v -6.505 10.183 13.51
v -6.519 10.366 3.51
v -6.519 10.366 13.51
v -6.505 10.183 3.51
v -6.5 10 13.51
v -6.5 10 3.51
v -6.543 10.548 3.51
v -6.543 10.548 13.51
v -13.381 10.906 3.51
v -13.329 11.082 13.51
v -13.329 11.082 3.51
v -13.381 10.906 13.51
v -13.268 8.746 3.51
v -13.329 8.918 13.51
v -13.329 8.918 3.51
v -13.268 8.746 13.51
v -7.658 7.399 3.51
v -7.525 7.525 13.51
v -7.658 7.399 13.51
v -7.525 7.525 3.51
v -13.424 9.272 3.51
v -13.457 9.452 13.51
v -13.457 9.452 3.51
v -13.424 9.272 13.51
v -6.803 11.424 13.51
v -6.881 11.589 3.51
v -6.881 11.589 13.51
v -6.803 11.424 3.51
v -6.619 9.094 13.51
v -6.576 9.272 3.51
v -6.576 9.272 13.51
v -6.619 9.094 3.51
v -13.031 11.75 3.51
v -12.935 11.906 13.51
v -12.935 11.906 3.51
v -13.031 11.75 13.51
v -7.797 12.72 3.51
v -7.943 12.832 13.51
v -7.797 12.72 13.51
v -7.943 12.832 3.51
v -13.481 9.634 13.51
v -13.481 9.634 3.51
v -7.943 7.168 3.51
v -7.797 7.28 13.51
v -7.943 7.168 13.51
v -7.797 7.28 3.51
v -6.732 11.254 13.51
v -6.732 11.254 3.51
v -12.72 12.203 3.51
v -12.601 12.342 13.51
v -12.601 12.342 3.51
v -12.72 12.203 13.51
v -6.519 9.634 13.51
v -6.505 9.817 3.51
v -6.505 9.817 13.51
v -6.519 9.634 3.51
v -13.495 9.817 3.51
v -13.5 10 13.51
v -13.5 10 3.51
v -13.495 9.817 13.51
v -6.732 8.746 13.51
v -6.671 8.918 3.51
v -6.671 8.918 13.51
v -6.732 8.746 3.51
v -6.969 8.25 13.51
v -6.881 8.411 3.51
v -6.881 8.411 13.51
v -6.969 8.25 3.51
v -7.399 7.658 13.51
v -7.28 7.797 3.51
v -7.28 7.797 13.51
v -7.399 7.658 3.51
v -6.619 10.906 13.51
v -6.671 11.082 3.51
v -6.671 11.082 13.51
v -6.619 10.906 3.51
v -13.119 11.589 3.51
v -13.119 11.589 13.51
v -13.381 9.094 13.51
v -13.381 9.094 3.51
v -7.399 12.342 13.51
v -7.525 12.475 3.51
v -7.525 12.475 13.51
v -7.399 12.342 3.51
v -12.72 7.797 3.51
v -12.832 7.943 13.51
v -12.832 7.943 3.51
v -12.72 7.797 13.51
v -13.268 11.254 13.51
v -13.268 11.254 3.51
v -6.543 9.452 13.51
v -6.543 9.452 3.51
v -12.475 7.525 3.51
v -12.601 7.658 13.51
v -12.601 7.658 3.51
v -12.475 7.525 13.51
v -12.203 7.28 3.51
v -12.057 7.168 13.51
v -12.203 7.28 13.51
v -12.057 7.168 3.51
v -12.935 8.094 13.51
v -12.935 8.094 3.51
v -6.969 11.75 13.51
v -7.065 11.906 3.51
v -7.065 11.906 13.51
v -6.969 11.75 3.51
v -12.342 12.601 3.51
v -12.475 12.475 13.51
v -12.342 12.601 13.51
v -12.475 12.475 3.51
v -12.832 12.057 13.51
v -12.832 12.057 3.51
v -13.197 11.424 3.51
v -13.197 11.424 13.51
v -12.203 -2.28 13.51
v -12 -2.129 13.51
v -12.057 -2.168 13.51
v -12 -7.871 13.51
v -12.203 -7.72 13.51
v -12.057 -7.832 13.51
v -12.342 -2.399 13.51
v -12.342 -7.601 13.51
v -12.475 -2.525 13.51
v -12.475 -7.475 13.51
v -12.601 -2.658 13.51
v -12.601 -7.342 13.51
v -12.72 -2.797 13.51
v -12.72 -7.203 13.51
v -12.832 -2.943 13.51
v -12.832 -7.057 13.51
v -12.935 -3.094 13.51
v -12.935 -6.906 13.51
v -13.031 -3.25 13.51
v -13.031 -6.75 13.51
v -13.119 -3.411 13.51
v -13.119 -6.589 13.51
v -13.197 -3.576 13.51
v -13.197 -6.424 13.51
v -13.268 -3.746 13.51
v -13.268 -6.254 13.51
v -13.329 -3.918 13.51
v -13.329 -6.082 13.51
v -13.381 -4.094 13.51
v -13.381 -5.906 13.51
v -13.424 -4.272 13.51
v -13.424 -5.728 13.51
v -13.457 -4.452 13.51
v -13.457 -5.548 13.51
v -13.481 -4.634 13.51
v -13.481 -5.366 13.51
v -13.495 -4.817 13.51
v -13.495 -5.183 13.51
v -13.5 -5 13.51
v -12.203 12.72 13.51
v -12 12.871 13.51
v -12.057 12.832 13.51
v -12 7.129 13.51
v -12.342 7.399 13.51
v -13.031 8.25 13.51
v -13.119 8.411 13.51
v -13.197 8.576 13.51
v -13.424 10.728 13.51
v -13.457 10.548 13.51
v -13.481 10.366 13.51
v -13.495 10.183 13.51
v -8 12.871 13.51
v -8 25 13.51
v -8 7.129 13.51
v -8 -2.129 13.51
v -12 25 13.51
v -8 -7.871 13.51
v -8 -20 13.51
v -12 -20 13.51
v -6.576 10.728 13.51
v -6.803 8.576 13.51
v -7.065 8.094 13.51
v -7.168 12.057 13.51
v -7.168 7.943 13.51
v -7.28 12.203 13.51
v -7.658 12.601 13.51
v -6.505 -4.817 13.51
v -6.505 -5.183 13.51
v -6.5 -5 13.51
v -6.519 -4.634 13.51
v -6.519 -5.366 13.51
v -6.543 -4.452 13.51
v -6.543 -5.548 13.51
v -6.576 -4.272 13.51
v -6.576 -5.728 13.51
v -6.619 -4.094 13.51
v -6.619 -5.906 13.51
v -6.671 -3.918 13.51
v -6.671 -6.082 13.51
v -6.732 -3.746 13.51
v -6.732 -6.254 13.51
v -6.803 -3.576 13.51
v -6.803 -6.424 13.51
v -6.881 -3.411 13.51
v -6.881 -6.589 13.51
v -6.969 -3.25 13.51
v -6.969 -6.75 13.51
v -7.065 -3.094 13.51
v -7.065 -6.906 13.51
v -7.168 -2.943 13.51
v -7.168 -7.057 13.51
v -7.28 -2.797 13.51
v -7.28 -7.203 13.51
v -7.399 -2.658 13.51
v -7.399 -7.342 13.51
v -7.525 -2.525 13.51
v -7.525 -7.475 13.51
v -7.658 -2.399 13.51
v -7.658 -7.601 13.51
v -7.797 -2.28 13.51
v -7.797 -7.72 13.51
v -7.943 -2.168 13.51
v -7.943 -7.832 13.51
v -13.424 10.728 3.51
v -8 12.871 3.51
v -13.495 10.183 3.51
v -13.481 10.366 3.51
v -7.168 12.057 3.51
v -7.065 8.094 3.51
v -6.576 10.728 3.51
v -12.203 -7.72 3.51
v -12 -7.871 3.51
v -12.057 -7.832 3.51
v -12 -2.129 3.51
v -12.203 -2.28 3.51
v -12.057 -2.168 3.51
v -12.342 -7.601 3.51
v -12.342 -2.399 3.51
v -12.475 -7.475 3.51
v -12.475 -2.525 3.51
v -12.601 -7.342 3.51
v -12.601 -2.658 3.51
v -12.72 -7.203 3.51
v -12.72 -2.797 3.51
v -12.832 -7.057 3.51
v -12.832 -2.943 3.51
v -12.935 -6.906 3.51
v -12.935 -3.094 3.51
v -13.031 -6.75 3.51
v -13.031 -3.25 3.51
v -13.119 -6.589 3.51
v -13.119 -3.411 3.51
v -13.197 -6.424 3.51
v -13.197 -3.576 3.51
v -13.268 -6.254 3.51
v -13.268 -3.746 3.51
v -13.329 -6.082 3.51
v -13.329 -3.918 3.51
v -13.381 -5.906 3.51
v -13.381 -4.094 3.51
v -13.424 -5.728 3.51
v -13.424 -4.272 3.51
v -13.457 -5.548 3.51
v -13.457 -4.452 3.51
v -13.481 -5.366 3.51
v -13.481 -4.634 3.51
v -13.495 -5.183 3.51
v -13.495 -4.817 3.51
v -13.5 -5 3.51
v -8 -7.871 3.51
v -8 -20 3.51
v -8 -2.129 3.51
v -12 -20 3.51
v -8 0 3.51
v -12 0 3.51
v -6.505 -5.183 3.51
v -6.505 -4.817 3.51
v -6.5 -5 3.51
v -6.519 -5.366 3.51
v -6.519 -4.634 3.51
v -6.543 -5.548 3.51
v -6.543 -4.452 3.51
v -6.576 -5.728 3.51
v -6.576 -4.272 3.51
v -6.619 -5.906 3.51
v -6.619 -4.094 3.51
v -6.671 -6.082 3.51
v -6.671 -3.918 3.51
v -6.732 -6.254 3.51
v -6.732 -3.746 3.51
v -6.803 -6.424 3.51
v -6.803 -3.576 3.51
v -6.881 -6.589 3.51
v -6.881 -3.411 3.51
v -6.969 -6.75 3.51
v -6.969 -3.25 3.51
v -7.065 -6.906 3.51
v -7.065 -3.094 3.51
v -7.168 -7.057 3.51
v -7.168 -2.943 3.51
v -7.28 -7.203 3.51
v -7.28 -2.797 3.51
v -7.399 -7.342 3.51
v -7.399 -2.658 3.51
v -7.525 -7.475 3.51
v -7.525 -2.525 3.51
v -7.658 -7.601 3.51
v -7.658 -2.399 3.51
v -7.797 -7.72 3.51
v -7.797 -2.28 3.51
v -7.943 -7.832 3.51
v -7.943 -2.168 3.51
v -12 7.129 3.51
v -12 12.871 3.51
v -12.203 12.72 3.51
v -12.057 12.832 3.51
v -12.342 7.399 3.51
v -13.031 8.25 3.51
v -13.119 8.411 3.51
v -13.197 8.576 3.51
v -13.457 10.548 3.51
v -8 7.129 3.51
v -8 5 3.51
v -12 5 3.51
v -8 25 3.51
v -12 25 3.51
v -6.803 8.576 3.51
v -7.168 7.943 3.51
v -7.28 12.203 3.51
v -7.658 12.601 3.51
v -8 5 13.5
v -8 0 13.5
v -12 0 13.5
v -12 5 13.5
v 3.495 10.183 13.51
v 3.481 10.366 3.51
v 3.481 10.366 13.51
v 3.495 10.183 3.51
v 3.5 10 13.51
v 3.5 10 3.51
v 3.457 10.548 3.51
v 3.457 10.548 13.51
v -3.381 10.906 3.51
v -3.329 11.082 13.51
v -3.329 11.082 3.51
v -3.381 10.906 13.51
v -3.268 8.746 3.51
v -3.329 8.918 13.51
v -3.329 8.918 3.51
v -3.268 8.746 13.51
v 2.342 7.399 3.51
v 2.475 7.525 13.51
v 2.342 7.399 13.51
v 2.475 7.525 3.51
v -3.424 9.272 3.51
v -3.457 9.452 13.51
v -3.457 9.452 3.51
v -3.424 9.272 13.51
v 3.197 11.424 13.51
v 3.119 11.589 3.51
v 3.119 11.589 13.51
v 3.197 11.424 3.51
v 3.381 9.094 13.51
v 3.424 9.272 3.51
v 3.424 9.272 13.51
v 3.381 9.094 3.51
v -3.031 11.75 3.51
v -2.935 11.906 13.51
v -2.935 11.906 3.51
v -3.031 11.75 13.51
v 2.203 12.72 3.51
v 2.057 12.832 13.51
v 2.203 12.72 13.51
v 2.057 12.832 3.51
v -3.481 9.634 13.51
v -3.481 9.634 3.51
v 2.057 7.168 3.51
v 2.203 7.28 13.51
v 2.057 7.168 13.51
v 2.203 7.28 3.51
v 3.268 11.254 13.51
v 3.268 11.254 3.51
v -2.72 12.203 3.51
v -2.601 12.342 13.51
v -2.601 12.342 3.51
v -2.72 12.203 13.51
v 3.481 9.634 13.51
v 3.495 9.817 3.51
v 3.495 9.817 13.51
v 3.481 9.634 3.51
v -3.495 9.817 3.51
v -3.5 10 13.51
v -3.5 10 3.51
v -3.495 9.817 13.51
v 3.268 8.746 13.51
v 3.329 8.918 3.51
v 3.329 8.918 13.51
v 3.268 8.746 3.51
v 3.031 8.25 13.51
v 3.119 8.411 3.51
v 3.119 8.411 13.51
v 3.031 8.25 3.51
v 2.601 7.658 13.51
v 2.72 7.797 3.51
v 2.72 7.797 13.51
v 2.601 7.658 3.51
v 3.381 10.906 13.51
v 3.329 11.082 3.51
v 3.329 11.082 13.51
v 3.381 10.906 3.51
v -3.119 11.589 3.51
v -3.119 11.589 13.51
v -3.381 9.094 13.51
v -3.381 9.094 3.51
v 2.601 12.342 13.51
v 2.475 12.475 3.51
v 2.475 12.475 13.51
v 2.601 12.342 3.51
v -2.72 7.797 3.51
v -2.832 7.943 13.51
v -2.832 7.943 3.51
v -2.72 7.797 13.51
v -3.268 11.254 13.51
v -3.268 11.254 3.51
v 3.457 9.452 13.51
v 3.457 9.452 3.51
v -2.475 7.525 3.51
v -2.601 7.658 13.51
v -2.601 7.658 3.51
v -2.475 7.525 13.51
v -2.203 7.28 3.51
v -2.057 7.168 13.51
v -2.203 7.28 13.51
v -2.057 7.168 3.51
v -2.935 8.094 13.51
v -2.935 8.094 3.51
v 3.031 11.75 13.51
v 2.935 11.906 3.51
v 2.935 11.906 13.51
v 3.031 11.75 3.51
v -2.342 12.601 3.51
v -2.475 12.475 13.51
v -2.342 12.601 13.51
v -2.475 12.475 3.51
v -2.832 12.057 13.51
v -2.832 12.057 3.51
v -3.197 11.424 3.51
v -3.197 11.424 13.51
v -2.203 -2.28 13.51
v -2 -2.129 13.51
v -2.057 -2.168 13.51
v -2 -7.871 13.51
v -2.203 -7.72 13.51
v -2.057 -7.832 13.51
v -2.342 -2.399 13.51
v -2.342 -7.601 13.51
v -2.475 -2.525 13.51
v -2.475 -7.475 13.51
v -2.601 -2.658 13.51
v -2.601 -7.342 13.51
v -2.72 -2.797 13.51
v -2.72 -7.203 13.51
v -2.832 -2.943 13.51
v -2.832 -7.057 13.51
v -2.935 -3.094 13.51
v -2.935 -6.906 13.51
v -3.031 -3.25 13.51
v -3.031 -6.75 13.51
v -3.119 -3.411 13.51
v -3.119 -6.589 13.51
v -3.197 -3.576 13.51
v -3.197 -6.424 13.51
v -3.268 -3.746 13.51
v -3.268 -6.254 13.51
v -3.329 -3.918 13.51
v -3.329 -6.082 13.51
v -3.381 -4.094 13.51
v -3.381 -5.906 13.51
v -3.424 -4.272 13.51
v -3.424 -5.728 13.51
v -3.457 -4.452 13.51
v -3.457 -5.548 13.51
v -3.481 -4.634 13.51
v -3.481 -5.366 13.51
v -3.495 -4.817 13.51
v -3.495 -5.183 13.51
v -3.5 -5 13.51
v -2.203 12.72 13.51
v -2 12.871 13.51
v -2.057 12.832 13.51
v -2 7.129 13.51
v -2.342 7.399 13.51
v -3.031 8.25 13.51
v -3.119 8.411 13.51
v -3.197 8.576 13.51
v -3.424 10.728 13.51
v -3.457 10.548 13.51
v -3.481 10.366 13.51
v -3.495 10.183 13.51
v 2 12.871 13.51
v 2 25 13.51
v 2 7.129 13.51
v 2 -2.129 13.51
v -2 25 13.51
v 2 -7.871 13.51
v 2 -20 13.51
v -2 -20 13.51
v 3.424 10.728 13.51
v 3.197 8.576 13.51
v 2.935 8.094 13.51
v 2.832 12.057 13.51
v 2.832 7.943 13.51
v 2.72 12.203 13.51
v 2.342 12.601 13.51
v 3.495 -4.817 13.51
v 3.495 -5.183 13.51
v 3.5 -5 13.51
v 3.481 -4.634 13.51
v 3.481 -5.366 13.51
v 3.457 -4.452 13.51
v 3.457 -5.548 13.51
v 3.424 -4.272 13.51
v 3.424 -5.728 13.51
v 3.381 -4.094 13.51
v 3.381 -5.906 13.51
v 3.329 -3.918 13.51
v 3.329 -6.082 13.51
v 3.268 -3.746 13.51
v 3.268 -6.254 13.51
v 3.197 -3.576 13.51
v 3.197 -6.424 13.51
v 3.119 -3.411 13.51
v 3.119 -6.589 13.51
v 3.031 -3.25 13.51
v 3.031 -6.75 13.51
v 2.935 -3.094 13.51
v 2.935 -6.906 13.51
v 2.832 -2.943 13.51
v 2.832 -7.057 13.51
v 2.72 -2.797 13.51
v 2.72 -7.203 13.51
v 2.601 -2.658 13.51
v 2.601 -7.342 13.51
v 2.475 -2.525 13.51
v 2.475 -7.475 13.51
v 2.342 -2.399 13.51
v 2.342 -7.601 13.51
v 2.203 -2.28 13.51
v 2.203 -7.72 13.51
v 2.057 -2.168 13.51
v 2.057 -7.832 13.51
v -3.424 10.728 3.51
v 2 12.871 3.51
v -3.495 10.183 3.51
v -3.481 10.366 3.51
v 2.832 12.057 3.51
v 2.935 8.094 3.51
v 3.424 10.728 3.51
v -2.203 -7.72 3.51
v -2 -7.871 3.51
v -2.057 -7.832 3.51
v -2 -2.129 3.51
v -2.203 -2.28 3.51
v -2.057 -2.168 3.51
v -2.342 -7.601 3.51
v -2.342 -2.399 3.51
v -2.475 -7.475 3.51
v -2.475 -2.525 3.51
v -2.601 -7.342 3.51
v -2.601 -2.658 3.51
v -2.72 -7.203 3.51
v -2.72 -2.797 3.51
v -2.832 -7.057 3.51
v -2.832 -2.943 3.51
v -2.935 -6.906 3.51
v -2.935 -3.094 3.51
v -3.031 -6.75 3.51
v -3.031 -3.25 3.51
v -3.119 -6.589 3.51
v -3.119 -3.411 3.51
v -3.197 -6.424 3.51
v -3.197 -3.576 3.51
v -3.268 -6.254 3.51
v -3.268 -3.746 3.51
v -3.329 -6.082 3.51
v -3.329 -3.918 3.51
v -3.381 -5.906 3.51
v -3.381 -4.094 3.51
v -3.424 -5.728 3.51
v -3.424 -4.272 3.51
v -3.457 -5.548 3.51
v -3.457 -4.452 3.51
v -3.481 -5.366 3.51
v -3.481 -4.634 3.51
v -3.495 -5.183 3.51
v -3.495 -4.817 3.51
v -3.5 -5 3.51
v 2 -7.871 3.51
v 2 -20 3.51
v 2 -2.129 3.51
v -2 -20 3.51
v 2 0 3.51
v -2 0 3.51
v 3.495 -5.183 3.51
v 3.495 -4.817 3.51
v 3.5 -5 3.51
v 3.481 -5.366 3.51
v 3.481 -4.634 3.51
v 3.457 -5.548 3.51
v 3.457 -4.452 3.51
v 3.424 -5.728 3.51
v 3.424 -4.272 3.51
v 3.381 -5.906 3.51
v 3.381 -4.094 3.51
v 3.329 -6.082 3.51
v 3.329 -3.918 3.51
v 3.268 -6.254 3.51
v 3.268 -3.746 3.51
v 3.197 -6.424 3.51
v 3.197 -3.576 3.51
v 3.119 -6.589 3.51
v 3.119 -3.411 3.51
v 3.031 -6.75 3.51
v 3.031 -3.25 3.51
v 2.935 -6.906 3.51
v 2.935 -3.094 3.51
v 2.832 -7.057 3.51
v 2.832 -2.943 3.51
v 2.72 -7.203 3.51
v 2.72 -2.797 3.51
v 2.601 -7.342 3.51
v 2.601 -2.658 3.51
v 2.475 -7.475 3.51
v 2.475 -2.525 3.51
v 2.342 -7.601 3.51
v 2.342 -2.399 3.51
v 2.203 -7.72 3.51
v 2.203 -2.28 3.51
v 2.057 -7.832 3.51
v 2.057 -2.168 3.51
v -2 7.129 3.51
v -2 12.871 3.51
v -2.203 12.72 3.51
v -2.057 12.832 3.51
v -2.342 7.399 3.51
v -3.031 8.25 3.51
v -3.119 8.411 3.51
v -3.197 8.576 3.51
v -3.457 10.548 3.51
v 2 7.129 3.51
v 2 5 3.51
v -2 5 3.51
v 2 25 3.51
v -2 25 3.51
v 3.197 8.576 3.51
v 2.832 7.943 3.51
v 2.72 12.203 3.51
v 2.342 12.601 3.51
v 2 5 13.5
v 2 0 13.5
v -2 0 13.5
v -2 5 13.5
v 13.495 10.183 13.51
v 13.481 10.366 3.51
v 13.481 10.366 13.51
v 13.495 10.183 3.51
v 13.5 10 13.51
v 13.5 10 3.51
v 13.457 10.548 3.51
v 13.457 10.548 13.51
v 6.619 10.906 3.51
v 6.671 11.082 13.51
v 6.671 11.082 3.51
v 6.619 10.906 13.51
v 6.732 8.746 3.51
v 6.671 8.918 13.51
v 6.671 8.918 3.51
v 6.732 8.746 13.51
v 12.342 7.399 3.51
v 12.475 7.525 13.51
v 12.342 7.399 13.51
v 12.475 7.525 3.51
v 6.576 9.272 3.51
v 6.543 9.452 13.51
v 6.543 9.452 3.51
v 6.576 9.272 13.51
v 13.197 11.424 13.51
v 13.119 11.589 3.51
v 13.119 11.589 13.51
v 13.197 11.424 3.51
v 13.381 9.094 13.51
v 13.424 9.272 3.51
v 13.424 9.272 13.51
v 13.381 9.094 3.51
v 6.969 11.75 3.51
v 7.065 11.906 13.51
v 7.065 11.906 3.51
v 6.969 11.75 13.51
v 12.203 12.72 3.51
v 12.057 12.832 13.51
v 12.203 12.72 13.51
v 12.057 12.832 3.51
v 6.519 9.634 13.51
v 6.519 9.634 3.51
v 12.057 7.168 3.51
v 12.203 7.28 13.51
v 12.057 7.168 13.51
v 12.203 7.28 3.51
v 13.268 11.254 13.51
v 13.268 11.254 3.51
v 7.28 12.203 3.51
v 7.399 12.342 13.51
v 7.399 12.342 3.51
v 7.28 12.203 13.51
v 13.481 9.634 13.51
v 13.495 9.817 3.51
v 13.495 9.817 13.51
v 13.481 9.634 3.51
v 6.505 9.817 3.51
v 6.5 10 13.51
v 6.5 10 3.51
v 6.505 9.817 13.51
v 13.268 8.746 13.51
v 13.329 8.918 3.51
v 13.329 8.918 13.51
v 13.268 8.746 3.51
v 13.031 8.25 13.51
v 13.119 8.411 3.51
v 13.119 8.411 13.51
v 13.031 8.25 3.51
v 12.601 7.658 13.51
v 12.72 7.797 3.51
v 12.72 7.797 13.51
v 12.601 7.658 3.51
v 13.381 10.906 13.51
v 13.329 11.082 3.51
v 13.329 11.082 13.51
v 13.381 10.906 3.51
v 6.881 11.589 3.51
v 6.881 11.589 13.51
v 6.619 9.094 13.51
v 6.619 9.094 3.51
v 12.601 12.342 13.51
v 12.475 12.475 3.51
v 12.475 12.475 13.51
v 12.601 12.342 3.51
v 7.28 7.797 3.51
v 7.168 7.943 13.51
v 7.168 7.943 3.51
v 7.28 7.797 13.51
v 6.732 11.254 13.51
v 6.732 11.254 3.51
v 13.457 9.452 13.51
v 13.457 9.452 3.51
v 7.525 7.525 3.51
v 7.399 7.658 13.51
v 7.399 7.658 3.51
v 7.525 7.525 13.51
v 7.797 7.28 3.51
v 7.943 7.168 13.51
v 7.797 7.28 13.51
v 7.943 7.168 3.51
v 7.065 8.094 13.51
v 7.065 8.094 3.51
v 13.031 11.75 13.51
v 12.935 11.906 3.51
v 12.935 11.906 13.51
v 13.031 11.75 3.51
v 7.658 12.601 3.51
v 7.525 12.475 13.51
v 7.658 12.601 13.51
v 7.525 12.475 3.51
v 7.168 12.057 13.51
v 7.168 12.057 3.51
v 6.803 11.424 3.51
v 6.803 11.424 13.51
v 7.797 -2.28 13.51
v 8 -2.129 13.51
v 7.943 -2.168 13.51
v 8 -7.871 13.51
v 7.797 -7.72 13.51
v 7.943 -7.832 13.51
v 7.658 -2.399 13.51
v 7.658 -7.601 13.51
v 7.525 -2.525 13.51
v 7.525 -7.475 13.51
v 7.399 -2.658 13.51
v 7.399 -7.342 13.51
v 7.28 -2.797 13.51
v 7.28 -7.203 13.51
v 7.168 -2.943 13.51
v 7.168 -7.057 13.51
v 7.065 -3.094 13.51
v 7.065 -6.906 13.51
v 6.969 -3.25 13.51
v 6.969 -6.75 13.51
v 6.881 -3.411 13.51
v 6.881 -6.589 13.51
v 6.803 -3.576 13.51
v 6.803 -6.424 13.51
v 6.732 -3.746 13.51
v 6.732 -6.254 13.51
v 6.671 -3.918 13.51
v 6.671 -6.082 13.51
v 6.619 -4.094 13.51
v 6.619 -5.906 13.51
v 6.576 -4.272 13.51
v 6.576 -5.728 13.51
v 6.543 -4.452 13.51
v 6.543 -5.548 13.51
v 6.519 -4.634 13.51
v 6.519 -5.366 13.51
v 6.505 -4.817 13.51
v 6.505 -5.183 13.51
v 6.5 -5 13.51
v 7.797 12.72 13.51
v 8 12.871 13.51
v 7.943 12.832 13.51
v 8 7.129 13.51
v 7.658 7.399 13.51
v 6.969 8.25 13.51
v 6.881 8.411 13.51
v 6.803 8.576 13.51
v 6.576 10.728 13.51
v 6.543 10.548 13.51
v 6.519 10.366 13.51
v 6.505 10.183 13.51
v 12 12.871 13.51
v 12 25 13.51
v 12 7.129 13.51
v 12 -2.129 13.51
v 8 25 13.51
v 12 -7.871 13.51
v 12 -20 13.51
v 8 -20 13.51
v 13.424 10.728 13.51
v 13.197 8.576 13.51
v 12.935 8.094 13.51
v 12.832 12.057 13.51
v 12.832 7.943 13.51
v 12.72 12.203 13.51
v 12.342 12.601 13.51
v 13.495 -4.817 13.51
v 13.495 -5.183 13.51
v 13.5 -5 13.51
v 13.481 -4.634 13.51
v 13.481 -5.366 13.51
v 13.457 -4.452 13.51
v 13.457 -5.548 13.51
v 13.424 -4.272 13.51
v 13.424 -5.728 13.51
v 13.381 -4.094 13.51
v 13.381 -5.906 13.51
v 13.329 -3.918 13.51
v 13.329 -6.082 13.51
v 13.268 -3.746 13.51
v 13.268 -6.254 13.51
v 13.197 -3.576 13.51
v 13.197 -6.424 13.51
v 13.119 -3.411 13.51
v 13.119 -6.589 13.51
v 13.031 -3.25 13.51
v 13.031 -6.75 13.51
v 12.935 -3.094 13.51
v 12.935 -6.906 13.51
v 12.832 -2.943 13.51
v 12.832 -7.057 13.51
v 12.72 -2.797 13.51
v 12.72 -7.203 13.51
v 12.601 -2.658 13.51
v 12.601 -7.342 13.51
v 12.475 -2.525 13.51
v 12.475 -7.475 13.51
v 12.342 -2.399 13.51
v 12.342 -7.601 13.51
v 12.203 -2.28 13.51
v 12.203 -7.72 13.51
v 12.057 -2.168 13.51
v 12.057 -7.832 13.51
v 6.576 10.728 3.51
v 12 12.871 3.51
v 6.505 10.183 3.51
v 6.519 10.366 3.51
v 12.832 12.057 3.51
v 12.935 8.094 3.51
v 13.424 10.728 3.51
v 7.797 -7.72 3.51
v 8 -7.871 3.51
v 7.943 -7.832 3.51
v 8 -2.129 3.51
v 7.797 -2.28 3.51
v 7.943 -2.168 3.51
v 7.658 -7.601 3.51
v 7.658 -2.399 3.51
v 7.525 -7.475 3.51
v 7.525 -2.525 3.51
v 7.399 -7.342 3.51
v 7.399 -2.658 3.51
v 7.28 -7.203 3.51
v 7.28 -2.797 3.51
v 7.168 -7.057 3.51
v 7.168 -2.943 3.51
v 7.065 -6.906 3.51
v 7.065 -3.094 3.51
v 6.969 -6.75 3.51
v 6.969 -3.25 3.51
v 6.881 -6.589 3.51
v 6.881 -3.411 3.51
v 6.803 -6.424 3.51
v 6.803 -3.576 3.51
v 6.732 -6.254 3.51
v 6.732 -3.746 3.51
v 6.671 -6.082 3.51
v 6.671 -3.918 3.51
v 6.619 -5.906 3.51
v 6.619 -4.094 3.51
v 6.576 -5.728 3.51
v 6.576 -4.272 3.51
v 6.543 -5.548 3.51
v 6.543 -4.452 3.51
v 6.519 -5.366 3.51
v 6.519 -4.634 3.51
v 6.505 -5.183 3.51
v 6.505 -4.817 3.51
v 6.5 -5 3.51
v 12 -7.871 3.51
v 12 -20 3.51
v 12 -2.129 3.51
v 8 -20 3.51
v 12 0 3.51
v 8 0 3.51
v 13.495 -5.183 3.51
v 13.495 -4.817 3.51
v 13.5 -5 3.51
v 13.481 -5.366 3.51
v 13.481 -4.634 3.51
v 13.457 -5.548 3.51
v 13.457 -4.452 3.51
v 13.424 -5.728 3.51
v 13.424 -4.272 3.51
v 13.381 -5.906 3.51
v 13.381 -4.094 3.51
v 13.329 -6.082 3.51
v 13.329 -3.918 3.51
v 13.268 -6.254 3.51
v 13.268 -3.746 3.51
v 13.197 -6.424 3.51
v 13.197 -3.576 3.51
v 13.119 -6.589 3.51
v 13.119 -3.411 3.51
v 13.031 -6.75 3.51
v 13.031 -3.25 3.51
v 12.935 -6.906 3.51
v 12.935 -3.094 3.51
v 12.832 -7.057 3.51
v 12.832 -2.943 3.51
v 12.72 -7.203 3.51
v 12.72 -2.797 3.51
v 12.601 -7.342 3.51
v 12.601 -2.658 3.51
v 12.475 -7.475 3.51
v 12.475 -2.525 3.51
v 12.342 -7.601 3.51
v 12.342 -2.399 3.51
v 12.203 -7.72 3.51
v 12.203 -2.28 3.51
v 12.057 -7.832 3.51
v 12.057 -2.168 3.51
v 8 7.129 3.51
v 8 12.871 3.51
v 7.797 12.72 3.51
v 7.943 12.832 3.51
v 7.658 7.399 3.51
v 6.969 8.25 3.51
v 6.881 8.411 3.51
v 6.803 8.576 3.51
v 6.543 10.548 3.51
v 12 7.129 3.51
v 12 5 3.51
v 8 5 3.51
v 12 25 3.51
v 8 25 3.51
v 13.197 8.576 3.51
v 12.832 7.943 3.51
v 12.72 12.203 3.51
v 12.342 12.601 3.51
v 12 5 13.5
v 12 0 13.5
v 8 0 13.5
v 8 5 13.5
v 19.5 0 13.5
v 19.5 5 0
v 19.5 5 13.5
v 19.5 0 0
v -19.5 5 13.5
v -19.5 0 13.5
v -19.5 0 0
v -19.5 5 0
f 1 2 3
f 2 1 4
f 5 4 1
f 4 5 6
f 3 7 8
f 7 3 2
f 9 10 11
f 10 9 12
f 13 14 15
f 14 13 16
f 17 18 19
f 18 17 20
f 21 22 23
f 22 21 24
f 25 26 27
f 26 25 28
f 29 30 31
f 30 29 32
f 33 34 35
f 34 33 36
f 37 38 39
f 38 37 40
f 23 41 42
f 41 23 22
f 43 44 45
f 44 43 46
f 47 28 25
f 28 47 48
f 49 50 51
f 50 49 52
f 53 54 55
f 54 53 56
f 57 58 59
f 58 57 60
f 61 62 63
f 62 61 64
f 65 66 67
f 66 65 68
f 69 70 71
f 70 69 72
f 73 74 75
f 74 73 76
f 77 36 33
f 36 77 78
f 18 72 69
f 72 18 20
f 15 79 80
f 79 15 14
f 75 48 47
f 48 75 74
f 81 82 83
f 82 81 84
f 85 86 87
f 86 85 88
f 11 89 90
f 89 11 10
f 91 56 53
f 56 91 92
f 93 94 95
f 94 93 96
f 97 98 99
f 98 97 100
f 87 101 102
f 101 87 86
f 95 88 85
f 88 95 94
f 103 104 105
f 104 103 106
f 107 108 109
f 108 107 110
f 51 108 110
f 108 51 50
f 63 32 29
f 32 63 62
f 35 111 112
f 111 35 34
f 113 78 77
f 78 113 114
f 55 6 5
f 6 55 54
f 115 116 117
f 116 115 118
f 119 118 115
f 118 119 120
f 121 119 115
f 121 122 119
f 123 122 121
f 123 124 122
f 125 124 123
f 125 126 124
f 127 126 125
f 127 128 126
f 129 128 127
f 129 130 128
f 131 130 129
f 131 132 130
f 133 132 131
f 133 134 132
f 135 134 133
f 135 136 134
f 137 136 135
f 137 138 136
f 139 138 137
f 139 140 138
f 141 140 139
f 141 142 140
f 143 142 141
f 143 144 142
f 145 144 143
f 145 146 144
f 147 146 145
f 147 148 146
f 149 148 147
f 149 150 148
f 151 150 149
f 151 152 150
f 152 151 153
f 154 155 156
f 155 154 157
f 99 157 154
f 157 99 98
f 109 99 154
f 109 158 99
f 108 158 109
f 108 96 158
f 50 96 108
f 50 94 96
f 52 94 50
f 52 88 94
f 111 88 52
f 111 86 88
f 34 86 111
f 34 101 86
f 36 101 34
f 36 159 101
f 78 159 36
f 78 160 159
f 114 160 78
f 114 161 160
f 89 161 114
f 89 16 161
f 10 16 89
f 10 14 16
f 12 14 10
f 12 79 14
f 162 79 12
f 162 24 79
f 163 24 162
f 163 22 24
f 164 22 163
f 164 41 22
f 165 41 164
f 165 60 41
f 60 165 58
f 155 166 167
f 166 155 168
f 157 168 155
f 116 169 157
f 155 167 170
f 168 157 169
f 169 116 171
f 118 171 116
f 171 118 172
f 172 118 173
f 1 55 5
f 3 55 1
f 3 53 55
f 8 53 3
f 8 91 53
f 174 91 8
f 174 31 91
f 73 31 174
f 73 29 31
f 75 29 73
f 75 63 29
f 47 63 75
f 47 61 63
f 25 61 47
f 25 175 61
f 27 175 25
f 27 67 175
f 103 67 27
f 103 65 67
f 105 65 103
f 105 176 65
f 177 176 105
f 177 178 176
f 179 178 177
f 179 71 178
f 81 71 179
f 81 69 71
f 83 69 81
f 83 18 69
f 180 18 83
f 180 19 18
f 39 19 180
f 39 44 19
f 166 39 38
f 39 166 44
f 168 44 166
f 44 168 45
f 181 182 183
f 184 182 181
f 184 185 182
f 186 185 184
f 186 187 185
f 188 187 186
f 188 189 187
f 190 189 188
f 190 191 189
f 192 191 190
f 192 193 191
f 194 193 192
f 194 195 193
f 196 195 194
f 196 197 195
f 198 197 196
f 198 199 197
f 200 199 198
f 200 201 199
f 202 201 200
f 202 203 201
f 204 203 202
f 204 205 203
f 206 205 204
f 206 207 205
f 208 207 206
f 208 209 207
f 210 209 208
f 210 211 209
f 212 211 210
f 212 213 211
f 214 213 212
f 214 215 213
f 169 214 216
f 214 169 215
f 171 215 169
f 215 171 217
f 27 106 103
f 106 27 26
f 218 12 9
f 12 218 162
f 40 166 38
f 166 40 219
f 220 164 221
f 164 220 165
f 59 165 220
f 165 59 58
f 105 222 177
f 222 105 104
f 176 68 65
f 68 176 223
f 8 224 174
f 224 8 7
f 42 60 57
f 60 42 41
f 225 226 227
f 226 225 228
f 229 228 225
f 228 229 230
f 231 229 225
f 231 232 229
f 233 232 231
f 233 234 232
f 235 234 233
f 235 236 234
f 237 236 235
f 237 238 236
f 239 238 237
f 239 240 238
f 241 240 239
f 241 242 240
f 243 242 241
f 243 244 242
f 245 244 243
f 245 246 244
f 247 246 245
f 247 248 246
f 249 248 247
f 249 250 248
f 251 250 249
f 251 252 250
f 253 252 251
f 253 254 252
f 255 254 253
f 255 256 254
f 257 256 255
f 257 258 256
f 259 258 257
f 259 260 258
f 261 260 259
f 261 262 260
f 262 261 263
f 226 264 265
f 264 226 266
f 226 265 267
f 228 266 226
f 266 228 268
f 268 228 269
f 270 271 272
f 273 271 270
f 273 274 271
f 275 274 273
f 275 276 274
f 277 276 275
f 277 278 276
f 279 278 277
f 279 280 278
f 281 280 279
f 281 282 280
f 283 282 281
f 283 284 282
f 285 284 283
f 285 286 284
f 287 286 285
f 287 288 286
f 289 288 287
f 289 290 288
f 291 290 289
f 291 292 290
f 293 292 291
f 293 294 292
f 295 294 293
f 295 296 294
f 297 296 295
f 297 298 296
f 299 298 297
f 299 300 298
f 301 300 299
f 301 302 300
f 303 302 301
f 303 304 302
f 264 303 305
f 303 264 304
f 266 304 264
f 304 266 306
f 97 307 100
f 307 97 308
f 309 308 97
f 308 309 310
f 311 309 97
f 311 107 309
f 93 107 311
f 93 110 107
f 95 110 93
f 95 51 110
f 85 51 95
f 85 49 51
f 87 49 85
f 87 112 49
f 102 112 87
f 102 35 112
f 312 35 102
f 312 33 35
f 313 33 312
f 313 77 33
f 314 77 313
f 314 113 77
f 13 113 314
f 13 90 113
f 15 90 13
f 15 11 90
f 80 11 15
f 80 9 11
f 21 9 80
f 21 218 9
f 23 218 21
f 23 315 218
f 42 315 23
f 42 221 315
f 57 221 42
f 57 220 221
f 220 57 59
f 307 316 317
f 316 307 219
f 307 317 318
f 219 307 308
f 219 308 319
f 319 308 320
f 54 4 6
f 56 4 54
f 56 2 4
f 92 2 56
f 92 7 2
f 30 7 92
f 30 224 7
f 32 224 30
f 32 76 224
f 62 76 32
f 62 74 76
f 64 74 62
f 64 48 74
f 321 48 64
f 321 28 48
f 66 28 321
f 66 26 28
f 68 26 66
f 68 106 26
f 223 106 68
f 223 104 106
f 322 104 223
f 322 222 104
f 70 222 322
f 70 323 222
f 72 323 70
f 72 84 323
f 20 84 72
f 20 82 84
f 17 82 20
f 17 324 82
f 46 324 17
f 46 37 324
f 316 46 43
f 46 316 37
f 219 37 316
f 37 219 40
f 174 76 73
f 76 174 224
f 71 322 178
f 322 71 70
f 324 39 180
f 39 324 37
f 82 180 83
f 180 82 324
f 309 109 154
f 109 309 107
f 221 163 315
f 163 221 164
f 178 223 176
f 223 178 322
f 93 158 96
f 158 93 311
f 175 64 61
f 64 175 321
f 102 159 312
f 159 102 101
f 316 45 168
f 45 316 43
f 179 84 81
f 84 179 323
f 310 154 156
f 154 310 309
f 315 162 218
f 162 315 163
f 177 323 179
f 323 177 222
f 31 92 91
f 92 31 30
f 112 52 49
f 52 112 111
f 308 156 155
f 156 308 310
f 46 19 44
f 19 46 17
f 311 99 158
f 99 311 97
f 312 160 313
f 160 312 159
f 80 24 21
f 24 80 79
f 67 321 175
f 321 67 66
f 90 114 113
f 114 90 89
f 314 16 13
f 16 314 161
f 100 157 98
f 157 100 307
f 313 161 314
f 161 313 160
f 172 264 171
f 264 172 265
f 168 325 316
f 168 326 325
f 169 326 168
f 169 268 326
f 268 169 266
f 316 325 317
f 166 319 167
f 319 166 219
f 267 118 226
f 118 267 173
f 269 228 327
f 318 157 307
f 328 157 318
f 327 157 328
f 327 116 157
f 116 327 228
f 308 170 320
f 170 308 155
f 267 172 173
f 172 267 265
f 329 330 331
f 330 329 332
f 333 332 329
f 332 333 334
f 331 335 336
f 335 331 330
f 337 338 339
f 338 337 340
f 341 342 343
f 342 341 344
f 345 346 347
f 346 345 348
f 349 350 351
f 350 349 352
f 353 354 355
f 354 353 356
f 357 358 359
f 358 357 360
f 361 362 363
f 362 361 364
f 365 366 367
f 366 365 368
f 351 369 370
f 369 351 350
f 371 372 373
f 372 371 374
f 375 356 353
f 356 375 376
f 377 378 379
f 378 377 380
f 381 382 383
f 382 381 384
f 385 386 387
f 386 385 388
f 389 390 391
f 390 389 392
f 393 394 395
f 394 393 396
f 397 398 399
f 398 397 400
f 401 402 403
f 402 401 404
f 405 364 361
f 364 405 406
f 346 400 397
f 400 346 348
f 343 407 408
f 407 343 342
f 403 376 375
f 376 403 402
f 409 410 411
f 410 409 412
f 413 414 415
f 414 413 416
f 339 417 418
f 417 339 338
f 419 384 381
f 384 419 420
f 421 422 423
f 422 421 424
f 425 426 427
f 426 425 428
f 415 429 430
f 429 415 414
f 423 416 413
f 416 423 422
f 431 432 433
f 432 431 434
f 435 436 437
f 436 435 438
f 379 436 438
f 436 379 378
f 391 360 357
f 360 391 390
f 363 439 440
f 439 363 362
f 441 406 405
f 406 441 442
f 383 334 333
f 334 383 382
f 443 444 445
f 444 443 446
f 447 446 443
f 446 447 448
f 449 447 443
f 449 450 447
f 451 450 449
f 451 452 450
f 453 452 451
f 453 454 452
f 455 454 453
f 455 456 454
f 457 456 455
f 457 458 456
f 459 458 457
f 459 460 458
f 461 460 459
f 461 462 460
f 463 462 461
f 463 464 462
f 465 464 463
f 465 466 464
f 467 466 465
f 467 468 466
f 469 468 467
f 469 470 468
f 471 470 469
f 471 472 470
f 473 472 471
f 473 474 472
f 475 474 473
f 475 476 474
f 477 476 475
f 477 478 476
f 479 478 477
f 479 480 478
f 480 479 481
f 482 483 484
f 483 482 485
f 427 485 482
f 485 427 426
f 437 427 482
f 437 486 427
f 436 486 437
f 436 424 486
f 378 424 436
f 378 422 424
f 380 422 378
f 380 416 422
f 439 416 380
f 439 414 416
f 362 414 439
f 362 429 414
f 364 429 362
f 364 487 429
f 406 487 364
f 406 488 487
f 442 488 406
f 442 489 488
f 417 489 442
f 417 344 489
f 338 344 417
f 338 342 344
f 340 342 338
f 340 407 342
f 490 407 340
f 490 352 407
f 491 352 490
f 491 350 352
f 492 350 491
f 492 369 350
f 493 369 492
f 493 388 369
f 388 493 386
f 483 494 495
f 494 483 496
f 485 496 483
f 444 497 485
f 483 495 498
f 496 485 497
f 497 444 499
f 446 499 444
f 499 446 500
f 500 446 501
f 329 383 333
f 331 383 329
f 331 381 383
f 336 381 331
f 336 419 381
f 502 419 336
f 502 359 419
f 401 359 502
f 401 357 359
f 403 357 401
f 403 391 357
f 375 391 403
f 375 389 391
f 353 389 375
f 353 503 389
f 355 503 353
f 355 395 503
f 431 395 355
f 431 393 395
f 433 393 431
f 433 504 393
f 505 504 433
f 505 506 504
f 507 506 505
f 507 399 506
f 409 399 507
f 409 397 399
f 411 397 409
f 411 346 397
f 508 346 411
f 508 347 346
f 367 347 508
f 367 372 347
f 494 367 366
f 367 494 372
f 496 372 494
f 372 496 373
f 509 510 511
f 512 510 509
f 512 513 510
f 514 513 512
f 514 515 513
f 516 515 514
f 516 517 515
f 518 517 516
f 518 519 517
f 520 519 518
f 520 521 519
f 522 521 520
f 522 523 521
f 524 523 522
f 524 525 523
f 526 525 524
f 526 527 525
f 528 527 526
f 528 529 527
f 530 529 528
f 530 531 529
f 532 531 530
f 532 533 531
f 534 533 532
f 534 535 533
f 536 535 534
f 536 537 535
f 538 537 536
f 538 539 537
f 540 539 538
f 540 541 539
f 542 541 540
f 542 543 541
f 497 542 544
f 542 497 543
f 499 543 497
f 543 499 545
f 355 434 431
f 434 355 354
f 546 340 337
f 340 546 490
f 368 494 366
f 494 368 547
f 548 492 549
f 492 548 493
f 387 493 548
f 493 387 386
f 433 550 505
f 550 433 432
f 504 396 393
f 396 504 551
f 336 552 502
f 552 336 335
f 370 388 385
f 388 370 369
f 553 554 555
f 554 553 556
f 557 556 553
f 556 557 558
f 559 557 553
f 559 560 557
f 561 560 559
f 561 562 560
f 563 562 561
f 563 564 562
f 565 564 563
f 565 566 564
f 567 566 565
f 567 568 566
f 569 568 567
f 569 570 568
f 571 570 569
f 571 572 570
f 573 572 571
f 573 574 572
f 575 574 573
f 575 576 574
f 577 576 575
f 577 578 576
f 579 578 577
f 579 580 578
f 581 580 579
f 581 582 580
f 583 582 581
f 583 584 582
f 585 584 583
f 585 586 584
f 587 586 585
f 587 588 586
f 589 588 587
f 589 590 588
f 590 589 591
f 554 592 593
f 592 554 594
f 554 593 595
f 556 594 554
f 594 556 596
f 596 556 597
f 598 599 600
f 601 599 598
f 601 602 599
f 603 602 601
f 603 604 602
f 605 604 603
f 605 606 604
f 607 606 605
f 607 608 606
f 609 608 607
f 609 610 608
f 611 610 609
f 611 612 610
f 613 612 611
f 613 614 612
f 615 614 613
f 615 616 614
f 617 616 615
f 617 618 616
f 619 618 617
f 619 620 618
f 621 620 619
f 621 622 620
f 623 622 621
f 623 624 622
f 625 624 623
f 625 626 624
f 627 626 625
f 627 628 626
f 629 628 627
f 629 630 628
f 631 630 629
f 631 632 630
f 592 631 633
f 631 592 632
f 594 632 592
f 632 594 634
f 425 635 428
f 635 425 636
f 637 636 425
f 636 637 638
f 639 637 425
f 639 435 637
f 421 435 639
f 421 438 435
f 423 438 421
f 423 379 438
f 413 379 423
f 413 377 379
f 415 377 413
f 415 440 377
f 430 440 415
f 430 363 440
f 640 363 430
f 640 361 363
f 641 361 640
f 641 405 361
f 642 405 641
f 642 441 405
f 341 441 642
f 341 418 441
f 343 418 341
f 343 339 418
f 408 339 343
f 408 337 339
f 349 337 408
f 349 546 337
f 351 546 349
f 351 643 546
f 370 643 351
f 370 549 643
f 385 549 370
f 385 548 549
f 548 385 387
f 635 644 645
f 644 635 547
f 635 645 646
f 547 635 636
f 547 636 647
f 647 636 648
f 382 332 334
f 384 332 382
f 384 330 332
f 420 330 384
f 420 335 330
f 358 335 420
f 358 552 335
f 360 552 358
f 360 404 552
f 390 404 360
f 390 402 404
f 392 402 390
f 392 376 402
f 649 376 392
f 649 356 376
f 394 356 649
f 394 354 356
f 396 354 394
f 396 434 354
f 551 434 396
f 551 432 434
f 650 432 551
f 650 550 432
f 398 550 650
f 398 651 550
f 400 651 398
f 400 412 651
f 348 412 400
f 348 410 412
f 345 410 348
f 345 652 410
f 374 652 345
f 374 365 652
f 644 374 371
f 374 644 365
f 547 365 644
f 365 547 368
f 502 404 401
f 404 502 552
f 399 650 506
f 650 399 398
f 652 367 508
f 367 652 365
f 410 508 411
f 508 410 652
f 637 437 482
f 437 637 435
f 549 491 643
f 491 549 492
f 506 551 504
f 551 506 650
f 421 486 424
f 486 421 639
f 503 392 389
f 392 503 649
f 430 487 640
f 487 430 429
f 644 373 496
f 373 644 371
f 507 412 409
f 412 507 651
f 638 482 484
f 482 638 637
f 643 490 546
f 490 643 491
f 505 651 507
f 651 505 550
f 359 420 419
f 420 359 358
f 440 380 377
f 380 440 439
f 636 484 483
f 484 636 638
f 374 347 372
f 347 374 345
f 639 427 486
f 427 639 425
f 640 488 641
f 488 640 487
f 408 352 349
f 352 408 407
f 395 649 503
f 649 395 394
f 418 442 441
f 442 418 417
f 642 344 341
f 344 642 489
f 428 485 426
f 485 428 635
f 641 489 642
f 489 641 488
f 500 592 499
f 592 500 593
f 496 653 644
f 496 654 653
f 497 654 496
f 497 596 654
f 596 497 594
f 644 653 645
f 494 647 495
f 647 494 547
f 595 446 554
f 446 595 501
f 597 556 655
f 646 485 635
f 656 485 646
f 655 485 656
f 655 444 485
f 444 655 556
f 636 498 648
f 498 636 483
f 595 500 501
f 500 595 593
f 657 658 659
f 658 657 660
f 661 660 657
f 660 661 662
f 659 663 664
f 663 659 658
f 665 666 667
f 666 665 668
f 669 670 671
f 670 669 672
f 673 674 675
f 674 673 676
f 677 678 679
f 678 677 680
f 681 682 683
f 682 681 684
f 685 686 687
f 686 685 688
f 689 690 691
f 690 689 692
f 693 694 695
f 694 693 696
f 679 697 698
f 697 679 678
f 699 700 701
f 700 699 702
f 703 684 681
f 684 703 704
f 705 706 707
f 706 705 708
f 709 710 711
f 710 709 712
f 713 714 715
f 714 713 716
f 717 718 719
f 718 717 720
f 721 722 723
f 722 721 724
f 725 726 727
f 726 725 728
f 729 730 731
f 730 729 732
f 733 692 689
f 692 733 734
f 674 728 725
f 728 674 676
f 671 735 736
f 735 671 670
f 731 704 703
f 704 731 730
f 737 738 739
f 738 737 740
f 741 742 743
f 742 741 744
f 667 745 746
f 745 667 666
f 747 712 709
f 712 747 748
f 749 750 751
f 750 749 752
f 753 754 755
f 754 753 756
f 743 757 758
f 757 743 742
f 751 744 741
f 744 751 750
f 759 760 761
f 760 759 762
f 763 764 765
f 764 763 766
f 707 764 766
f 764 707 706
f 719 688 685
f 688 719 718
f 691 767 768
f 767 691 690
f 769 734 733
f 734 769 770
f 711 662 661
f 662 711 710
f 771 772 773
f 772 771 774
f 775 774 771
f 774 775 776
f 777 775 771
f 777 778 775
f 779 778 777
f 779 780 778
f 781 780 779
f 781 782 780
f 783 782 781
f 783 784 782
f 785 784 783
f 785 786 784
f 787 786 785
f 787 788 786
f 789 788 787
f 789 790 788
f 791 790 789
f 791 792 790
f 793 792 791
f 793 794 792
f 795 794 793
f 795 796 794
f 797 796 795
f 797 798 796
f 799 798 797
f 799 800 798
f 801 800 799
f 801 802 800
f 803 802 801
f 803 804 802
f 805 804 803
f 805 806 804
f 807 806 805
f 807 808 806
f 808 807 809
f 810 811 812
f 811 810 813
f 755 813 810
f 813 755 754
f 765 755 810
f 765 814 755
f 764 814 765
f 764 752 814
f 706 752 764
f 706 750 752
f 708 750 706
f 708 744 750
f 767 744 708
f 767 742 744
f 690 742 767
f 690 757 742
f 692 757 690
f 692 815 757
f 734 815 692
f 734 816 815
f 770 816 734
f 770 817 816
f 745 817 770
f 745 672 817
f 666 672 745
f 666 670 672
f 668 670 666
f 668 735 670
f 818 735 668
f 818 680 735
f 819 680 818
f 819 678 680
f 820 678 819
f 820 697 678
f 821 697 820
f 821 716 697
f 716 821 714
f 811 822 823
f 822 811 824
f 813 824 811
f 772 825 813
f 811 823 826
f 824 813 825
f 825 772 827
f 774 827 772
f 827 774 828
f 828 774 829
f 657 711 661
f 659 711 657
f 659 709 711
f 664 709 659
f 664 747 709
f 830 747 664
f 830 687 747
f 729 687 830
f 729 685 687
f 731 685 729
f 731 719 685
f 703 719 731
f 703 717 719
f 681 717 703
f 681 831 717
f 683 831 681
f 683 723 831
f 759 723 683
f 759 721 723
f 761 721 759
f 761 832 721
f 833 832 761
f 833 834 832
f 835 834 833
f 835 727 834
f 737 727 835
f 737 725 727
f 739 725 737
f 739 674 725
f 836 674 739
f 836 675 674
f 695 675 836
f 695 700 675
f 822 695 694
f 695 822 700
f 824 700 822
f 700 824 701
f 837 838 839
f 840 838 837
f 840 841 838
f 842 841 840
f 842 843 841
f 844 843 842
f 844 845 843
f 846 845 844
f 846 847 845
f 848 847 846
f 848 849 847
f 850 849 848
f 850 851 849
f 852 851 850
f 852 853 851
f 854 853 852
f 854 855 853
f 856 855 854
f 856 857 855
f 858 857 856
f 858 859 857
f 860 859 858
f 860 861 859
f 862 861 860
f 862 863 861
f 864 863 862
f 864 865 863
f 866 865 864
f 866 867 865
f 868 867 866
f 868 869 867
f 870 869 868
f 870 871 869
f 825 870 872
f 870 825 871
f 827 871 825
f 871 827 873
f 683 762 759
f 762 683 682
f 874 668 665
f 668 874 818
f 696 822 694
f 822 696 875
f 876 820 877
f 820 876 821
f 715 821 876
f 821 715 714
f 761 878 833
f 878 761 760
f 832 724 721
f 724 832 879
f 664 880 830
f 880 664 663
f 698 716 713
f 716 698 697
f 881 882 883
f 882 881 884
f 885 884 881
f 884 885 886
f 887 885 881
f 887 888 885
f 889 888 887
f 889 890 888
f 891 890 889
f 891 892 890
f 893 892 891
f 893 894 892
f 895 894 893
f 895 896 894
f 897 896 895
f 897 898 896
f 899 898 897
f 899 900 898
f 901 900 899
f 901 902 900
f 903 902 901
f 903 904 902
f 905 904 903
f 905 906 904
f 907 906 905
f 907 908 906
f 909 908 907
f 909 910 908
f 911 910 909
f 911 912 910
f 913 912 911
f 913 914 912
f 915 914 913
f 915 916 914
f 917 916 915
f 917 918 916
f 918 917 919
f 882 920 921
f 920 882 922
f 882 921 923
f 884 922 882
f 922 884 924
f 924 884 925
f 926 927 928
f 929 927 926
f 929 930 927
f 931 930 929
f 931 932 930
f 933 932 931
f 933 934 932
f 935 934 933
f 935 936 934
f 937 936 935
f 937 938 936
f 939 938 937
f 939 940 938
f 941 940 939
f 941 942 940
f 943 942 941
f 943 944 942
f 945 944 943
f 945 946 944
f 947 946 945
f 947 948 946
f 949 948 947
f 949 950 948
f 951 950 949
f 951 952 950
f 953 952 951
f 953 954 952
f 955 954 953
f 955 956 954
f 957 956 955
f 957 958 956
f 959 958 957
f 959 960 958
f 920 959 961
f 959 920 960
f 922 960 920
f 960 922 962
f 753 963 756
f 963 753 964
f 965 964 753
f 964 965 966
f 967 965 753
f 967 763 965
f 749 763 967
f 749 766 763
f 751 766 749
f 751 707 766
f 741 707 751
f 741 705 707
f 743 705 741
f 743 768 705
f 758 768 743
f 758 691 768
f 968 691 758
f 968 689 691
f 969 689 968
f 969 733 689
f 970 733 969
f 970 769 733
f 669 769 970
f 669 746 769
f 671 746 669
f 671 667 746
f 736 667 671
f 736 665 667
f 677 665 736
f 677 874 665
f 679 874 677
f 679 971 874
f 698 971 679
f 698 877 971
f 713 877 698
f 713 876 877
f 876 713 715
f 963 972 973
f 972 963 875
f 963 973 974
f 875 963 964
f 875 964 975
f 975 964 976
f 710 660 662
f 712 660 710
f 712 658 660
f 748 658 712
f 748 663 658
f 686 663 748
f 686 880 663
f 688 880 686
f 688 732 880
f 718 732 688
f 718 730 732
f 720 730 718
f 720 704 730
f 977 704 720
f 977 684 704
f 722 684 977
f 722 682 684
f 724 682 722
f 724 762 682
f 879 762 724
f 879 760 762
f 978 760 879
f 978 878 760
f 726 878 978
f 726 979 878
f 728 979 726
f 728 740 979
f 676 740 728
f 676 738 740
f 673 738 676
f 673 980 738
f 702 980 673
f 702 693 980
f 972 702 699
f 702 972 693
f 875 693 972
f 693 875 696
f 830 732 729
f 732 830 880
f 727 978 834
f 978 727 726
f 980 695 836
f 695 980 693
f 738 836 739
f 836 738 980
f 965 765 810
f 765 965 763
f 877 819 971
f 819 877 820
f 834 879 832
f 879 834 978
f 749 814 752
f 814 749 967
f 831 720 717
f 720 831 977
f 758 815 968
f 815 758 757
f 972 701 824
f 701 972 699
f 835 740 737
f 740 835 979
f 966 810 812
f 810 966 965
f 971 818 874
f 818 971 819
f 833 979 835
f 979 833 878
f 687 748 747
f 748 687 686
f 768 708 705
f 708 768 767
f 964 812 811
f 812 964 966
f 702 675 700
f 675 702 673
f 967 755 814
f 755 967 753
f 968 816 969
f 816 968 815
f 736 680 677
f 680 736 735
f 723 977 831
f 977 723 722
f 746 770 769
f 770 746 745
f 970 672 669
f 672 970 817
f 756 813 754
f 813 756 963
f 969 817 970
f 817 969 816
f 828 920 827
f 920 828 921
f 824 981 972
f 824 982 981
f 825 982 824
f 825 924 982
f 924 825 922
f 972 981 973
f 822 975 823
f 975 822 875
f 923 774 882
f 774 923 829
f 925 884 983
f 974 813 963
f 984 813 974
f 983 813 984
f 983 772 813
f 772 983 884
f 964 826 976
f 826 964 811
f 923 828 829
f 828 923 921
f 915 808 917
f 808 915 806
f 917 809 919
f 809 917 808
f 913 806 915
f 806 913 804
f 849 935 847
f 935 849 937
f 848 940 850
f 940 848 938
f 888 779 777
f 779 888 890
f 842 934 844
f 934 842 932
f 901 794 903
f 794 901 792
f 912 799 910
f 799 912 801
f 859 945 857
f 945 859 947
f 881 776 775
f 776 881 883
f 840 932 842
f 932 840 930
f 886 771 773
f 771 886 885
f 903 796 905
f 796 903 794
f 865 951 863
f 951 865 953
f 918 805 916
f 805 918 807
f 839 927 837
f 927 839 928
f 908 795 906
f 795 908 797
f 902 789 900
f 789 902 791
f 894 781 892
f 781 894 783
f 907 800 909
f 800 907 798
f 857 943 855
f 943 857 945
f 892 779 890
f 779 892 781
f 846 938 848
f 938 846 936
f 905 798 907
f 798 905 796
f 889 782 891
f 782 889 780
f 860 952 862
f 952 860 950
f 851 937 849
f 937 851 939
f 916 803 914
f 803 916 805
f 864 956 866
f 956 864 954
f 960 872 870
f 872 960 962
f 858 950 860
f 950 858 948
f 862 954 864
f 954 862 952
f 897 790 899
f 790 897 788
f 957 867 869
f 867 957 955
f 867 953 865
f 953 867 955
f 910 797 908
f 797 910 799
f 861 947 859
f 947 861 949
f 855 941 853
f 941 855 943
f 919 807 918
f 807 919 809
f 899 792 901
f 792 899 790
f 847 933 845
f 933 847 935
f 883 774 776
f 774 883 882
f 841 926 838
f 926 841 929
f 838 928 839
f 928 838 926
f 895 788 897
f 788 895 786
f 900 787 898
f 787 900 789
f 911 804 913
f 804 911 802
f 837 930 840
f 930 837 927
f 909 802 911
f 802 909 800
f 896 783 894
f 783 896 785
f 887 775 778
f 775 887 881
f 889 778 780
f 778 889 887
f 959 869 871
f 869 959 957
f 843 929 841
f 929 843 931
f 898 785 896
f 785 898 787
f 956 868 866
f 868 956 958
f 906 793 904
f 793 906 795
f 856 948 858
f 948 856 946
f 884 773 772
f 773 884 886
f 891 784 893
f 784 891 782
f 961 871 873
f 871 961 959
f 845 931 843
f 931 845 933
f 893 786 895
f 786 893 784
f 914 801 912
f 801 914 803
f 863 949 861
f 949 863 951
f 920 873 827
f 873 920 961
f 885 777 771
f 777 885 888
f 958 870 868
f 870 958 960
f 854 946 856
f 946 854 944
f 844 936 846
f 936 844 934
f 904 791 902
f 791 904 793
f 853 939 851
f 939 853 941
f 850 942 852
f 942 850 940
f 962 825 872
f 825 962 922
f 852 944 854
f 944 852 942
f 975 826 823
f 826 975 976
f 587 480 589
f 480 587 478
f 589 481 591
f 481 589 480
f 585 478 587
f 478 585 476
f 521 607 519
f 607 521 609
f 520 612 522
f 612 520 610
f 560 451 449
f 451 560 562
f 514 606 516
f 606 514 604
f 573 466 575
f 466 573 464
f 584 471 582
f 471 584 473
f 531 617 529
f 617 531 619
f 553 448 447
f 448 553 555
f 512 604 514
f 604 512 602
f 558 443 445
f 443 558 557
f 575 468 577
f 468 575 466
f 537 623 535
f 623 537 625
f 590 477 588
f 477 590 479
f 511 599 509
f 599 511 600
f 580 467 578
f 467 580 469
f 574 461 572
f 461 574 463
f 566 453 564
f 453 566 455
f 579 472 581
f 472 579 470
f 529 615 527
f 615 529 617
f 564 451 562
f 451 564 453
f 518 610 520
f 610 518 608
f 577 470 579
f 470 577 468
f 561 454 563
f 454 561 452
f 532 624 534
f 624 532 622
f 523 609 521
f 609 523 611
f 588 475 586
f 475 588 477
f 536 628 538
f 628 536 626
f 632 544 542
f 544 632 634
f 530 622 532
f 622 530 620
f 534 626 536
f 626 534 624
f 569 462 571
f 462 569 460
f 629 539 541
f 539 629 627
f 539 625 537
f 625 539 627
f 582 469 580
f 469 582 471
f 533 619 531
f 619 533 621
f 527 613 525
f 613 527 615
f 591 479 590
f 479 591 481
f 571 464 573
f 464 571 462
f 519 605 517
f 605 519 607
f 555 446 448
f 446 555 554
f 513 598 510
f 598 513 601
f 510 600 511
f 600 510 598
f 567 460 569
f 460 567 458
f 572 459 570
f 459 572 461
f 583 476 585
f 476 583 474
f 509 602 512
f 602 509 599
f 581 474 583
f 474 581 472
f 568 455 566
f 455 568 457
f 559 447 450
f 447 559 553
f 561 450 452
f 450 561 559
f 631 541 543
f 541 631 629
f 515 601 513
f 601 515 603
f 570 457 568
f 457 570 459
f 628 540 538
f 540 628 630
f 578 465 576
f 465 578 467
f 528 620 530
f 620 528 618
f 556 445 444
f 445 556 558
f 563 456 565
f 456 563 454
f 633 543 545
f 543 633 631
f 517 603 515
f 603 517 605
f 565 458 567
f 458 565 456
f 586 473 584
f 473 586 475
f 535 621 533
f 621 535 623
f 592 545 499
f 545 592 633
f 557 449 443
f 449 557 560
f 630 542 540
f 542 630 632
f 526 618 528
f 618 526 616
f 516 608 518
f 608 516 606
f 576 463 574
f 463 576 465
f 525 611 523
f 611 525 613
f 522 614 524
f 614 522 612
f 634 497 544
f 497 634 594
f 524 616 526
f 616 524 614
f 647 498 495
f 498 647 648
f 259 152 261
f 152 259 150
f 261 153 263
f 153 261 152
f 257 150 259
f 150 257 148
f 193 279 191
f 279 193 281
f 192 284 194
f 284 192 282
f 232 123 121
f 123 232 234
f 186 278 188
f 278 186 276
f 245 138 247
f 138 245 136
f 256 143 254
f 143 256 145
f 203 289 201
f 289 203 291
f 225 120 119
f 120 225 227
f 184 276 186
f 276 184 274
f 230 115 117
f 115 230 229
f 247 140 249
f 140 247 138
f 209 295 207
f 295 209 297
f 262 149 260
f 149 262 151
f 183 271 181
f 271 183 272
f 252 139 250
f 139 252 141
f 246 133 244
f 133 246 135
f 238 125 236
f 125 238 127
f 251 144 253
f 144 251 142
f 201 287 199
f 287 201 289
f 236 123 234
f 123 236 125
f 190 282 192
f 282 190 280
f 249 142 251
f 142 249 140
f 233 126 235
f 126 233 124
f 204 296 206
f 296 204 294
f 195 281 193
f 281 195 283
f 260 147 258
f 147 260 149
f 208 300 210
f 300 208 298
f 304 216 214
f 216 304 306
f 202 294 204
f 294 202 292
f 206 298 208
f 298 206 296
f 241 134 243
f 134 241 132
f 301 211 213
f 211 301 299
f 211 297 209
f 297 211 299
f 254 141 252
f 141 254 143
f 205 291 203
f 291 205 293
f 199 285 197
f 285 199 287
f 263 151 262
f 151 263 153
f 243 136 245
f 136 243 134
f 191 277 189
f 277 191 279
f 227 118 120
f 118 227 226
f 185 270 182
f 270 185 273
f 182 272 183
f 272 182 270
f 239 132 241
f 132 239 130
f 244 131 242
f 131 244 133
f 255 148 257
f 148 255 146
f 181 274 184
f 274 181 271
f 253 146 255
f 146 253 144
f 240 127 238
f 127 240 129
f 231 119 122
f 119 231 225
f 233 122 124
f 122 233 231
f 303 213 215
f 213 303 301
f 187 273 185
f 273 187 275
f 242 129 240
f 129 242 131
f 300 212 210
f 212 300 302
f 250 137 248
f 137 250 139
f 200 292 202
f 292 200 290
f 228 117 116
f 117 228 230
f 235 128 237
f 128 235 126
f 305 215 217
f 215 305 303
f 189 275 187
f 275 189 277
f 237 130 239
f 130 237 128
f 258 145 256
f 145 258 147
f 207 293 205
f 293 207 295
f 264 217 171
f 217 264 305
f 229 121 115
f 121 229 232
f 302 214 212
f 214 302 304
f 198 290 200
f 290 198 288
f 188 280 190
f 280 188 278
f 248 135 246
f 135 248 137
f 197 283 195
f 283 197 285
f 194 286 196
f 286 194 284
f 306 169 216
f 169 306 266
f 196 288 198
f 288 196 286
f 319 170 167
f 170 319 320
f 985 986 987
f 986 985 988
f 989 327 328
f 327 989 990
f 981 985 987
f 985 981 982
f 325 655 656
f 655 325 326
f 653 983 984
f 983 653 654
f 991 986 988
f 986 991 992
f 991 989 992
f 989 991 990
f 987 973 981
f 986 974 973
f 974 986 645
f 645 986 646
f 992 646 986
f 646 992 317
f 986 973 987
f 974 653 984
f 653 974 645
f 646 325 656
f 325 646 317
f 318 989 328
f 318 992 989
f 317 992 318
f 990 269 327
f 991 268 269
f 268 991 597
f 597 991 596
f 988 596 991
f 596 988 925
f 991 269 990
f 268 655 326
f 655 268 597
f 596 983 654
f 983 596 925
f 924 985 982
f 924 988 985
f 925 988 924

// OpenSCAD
// file: ../helper/m_skrew.scad
/*
  Author: Johannes Bayer, 2025
  License: MIT
  Description: Envelope of the most used M Skrew
*/

M_SKREW_HEAD_DIA = 8.5;
M_SKREW_HEAD_LEN = 4.8;
M_SKREW_SHAFT_DIA = 5.0;
M_SKREW_SHAFT_LEN = 15.8;


module m_skrew_head(){

    translate([0, 0, M_SKREW_SHAFT_LEN])
        cylinder(d=M_SKREW_HEAD_DIA,h=M_SKREW_HEAD_LEN);

}


module m_skrew_shaft(){

    cylinder(d=M_SKREW_SHAFT_DIA,h=M_SKREW_SHAFT_LEN+M_SKREW_HEAD_LEN);

}


module m_skrew(){

    m_skrew_head();
    m_skrew_shaft();

}


module m_skrew_eject(length=5){
    // Helper Function to remove material for Mounting a Tightened Skrew
    // in Reversed Position

    // Push
    translate([0,length,0])
        cylinder(d=M_SKREW_HEAD_DIA,h=M_SKREW_HEAD_LEN+M_SKREW_SHAFT_LEN);

    // Slide
    hull(){
        m_skrew_head();
        translate([0,length,0])
            m_skrew_head();
    };

    // Slide
    hull(){
        m_skrew_shaft();
        translate([0,length,0])
            m_skrew_shaft();
    };

}
// file: ../helper/base_plate.scad
/*
  Author: Johannes Bayer, 2025
  License: MIT
  Description: Helper Function to generate a cuboid with rounded side corners
*/

module base_plate(width, depth, thickness, corner_radius=0){
    
    translate([corner_radius-depth/2,corner_radius-width/2,0])
        minkowski(){
            cube([depth-corner_radius*2,
                  width-corner_radius*2,
                  thickness-1]);
            cylinder(r=corner_radius,h=1);
            }
}


// Sample Usage
base_plate(30,40,10,5);
// file: ../helper/connector_a.scad
// Connector to mount 
CONN_THICK = 10;
CONN_HEAD_DIA = 7;
CONN_HEAD_COUNT = 3;
CONN_HEAD_DIST = 10;
CONN_SHAFT_DIA = 4;
CONN_SHAFT_THICK = 11;


module connector(shift_x, shift_y, angle){
    translate([shift_x, shift_y, 0])
        rotate([0,0,angle])
            for (head=[-1:1])
                translate([head*CONN_HEAD_DIST, 5, BASE_THICKNESS-CONN_THICK+0.01])
                    union(){
                        cylinder(d=CONN_HEAD_DIA, h=CONN_THICK);
                        translate([-CONN_SHAFT_DIA/2, -30, 0])
                            cube([CONN_SHAFT_DIA, 30, CONN_THICK]);
                    }
}
// file: ../helper/linear_wagon.scad
use <../helper/base_plate.scad>
include <../helper/connector_a.scad>
include <../helper/m_skrew.scad>

/*
  Author: Johannes Bayer, 2025
  License: MIT
  Description: Mount Plate to (Linear Support Wagon) HGH20CA
*/

BASE_WIDTH = 75;
BASE_HEIGHT = 44;
BASE_THICKNESS = 13.5;
BASE_CORNER = 2.5;

M_SKREW_SINK = 7;
M_SKREW_DIST_X = 40.35-M_SKREW_SHAFT_DIA;
M_SKREW_DIST_Y = 36.66-M_SKREW_SHAFT_DIA;


module HGH20CA_plate(overhang=0, connector_left=true, connector_right=true){
    
    difference(){
        base_plate(BASE_WIDTH,BASE_HEIGHT+overhang,BASE_THICKNESS,BASE_CORNER);
        union(){
            for (shift_x=[-1:2:2])
                for (shift_y=[-1:2:1])
                    translate([BASE_HEIGHT/2+(shift_x)*M_SKREW_DIST_Y/2,
                               BASE_WIDTH/2+(shift_y)*M_SKREW_DIST_X/2,
                               -M_SKREW_SINK])
                        m_skrew();
            if (connector_right)
                connector(BASE_HEIGHT/2,0,0);
            if (connector_left)
                connector(BASE_HEIGHT/2,BASE_WIDTH,180);
        }
    }
}

// Sample Usage
//$fn=120;
//HGH20CA_plate();
// main file
include <../helper/linear_wagon.scad>
include <../helper/connector_a.scad>

/*
  Author: Johannes Bayer, 2025
  License: MIT
  Description: Connects two Linear Rail Support Wagons
*/

TOLERANCE = 0.01;



module wagon_connector(spacing=5){

    connector(shift_x=0, shift_y=spacing, angle=0, shaft_len=10);
    connector(shift_x=0, shift_y=0, angle=180, shaft_len=10);

    translate([BASE_CORNER-BASE_HEIGHT/2,0,0])
        cube([BASE_HEIGHT-2*BASE_CORNER,
              spacing,
              BASE_THICKNESS]);

}

wagon_connector($fn=120);
